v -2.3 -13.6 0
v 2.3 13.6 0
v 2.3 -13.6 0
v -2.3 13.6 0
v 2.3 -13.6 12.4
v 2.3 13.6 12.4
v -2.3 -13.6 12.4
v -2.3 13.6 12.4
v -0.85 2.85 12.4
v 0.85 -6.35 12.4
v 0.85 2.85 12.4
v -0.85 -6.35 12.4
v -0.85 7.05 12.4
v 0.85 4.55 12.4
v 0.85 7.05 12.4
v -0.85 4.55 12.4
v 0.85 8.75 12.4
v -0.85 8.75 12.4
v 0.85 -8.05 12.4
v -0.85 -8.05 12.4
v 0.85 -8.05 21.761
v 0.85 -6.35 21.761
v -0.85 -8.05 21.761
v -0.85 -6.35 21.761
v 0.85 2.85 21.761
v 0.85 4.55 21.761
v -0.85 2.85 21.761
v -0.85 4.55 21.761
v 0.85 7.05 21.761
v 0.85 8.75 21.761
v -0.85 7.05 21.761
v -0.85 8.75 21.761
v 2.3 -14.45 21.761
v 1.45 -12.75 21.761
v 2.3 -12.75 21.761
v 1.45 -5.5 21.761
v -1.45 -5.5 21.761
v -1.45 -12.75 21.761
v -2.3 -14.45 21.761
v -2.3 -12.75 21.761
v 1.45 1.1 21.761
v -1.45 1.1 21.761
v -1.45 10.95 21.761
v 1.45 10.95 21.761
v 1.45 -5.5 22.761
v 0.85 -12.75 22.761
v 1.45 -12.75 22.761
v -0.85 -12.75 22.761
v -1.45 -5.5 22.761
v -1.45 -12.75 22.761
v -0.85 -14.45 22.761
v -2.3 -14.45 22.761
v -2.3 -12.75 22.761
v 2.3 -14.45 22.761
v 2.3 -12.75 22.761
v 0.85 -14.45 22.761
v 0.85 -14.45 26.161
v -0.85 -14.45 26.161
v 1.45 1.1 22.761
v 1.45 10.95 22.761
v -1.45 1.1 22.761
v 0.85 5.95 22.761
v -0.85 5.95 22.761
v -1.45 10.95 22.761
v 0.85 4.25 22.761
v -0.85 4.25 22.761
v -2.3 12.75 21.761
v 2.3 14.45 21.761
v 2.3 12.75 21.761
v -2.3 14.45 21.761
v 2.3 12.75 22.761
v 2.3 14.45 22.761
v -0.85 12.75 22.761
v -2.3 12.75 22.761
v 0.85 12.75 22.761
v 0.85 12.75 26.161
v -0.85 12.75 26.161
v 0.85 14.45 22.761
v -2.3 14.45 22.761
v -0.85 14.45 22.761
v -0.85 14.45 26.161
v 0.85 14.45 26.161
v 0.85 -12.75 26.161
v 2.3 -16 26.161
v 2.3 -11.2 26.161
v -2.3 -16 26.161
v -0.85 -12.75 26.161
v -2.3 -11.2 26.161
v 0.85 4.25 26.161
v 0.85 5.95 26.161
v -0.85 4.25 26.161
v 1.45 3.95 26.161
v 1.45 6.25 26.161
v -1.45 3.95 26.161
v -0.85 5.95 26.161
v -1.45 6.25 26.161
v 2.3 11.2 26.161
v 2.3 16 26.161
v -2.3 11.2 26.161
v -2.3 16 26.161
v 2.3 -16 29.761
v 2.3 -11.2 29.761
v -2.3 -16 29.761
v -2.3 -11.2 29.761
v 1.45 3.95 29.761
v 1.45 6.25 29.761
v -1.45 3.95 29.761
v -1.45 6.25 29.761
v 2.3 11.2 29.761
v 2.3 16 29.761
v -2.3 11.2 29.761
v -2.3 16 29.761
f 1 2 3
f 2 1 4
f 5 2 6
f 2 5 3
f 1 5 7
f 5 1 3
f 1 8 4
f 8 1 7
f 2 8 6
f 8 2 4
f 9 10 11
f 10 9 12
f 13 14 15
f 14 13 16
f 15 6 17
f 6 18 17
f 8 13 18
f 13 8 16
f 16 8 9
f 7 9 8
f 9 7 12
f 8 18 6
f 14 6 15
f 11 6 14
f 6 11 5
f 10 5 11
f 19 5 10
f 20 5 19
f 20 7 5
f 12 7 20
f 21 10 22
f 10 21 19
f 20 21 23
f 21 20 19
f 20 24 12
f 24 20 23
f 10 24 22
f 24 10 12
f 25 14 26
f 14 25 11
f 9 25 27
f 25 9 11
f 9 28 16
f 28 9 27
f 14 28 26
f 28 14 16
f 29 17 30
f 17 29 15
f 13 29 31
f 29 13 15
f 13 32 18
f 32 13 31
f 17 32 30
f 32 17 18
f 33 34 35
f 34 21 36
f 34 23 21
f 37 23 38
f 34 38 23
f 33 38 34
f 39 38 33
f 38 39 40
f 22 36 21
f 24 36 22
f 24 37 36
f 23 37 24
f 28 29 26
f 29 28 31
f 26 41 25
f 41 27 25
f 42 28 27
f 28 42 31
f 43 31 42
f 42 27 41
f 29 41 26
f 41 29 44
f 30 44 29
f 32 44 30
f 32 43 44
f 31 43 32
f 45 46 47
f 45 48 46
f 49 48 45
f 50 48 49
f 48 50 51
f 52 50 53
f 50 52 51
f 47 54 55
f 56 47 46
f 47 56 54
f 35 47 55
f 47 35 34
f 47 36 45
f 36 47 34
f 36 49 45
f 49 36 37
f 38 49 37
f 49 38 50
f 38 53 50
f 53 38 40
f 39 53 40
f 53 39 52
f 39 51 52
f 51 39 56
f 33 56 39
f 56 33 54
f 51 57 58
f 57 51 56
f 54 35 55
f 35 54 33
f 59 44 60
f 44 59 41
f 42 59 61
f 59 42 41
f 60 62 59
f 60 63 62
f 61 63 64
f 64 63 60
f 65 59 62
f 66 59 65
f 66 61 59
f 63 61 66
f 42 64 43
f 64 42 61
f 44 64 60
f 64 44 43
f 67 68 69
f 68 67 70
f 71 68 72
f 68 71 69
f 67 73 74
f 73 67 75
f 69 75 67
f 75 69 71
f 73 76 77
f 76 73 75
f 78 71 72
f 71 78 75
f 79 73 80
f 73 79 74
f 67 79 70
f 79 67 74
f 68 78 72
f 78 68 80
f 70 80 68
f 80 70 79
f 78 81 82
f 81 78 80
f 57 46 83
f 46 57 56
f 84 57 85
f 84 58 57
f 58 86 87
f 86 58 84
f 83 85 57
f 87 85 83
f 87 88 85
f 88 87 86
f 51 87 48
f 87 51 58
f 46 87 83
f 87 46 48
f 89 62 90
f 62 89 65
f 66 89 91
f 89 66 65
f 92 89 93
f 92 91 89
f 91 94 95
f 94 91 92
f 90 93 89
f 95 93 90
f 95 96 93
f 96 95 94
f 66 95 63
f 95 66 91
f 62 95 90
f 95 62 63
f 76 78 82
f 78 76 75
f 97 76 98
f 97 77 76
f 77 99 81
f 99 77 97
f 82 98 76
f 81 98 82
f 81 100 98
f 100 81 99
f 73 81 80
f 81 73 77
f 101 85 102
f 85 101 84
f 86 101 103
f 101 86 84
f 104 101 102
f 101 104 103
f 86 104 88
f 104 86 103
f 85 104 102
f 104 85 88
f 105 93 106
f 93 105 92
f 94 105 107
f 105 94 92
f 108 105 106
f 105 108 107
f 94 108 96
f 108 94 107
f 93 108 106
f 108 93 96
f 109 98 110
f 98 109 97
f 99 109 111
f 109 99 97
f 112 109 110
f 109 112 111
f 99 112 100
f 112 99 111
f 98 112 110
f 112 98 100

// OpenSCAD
// Generated by SolidPython 0.4.2 on 2020-09-29 23:22:30
//!OpenSCAD

scale(v = 0.0100000000) {
	translate(v = [-230, -1360, 0]) {
		union() {
			color(c = [0.4000000000, 0.4000000000, 0.4000000000]) {
				translate(v = [0, 0, 0]) {
					linear_extrude(height = 1000.0000000000) {
						polygon(paths = [[0, 1, 2, 3]], points = [[0, 0], [0, 2720], [460, 2720], [460, 0]]);
					}
				}
			}
			color(c = [0.2000000000, 0.6000000000, 0.2000000000]) {
				translate(v = [0, 0, 1000.0000000000]) {
					linear_extrude(height = 120.0000000000) {
						polygon(paths = [[0, 1, 2, 3]], points = [[0, 1305], [0, 2720], [460, 2720], [460, 1305]]);
					}
				}
			}
			color(c = [0.4000000000, 0.4000000000, 0.4000000000]) {
				translate(v = [0, 0, 1000.0000000000]) {
					linear_extrude(height = 120.0000000000) {
						polygon(paths = [[0, 1, 2, 3]], points = [[0, 0], [0, 1305], [460, 1305], [460, 0]]);
					}
				}
			}
			color(c = [0.2000000000, 0.6000000000, 0.2000000000]) {
				translate(v = [0, 0, 1120.0000000000]) {
					linear_extrude(height = 120.0000000000) {
						polygon(paths = [[0, 1, 2, 3]], points = [[0, 1305], [0, 2720], [460, 2720], [460, 1305]]);
					}
				}
			}
			color(c = [0.4000000000, 0.4000000000, 0.4000000000]) {
				translate(v = [0, 0, 1120.0000000000]) {
					linear_extrude(height = 120.0000000000) {
						polygon(paths = [[0, 1, 2, 3]], points = [[0, 0], [0, 1305], [460, 1305], [460, 0]]);
					}
				}
			}
			color(c = [0.1000000000, 0.1000000000, 0.1000000000]) {
				translate(v = [0, 0, 1240.0000000000]) {
					linear_extrude(height = 70.0000000000) {
						polygon(paths = [[0, 1, 2, 3]], points = [[145, 555], [145, 725], [315, 725], [315, 555]]);
					}
				}
			}
			color(c = [0.1000000000, 0.1000000000, 0.1000000000]) {
				translate(v = [0, 0, 1240.0000000000]) {
					linear_extrude(height = 70.0000000000) {
						polygon(paths = [[0, 1, 2, 3]], points = [[145, 1645], [145, 1815], [315, 1815], [315, 1645]]);
					}
				}
			}
			color(c = [0.1000000000, 0.1000000000, 0.1000000000]) {
				translate(v = [0, 0, 1240.0000000000]) {
					linear_extrude(height = 70.0000000000) {
						polygon(paths = [[0, 1, 2, 3]], points = [[145, 2065], [145, 2235], [315, 2235], [315, 2065]]);
					}
				}
			}
			color(c = [0.1000000000, 0.1000000000, 0.1000000000]) {
				translate(v = [0, 0, 1310.0000000000]) {
					linear_extrude(height = 180.0000000000) {
						polygon(paths = [[0, 1, 2, 3]], points = [[145, 555], [145, 725], [315, 725], [315, 555]]);
					}
				}
			}
			color(c = [0.1000000000, 0.1000000000, 0.1000000000]) {
				translate(v = [0, 0, 1310.0000000000]) {
					linear_extrude(height = 180.0000000000) {
						polygon(paths = [[0, 1, 2, 3]], points = [[145, 1645], [145, 1815], [315, 1815], [315, 1645]]);
					}
				}
			}
			color(c = [0.1000000000, 0.1000000000, 0.1000000000]) {
				translate(v = [0, 0, 1310.0000000000]) {
					linear_extrude(height = 180.0000000000) {
						polygon(paths = [[0, 1, 2, 3]], points = [[145, 2065], [145, 2235], [315, 2235], [315, 2065]]);
					}
				}
			}
			color(c = [0.1000000000, 0.1000000000, 0.1000000000]) {
				translate(v = [0, 0, 1490.0000000000]) {
					linear_extrude(height = 686.1000000000) {
						polygon(paths = [[0, 1, 2, 3]], points = [[145, 555], [145, 725], [315, 725], [315, 555]]);
					}
				}
			}
			color(c = [0.1000000000, 0.1000000000, 0.1000000000]) {
				translate(v = [0, 0, 1490.0000000000]) {
					linear_extrude(height = 686.1000000000) {
						polygon(paths = [[0, 1, 2, 3]], points = [[145, 1645], [145, 1815], [315, 1815], [315, 1645]]);
					}
				}
			}
			color(c = [0.1000000000, 0.1000000000, 0.1000000000]) {
				translate(v = [0, 0, 1490.0000000000]) {
					linear_extrude(height = 686.1000000000) {
						polygon(paths = [[0, 1, 2, 3]], points = [[145, 2065], [145, 2235], [315, 2235], [315, 2065]]);
					}
				}
			}
			color(c = [0.9000000000, 0.6000000000, 0.6000000000]) {
				translate(v = [0, 0, 2176.1000000000]) {
					linear_extrude(height = 100.0000000000) {
						polygon(paths = [[0, 1, 2, 3, 4, 5, 6, 7]], points = [[0, -85], [0, 85], [85, 85], [85, 810], [375, 810], [375, 85], [460, 85], [460, -85]]);
					}
				}
			}
			color(c = [0.9000000000, 0.6000000000, 0.6000000000]) {
				translate(v = [0, 0, 2176.1000000000]) {
					linear_extrude(height = 100.0000000000) {
						polygon(paths = [[0, 1, 2, 3]], points = [[85, 1470], [85, 2455], [375, 2455], [375, 1470]]);
					}
				}
			}
			color(c = [0.9000000000, 0.6000000000, 0.6000000000]) {
				translate(v = [0, 0, 2176.1000000000]) {
					linear_extrude(height = 100.0000000000) {
						polygon(paths = [[0, 1, 2, 3]], points = [[0, 2635], [0, 2805], [460, 2805], [460, 2635]]);
					}
				}
			}
			color(c = [0.5000000000, 0.5000000000, 0.5000000000]) {
				translate(v = [0, 0, 2276.1000000000]) {
					linear_extrude(height = 340.0000000000) {
						polygon(paths = [[0, 1, 2, 3]], points = [[145, -85], [145, 85], [315, 85], [315, -85]]);
					}
				}
			}
			color(c = [0.5000000000, 0.5000000000, 0.5000000000]) {
				translate(v = [0, 0, 2276.1000000000]) {
					linear_extrude(height = 340.0000000000) {
						polygon(paths = [[0, 1, 2, 3]], points = [[145, 1785], [145, 1955], [315, 1955], [315, 1785]]);
					}
				}
			}
			color(c = [0.5000000000, 0.5000000000, 0.5000000000]) {
				translate(v = [0, 0, 2276.1000000000]) {
					linear_extrude(height = 340.0000000000) {
						polygon(paths = [[0, 1, 2, 3]], points = [[145, 2635], [145, 2805], [315, 2805], [315, 2635]]);
					}
				}
			}
			color(c = [0.3000000000, 0.3000000000, 1]) {
				translate(v = [0, 0, 2616.1000000000]) {
					linear_extrude(height = 360.0000000000) {
						polygon(paths = [[0, 1, 2, 3]], points = [[0, -240], [0, 240], [460, 240], [460, -240]]);
					}
				}
			}
			color(c = [0.3000000000, 0.3000000000, 1]) {
				translate(v = [0, 0, 2616.1000000000]) {
					linear_extrude(height = 360.0000000000) {
						polygon(paths = [[0, 1, 2, 3]], points = [[85, 1755], [85, 1985], [375, 1985], [375, 1755]]);
					}
				}
			}
			color(c = [0.3000000000, 0.3000000000, 1]) {
				translate(v = [0, 0, 2616.1000000000]) {
					linear_extrude(height = 360.0000000000) {
						polygon(paths = [[0, 1, 2, 3]], points = [[0, 2480], [0, 2960], [460, 2960], [460, 2480]]);
					}
				}
			}
		}
	}
}
